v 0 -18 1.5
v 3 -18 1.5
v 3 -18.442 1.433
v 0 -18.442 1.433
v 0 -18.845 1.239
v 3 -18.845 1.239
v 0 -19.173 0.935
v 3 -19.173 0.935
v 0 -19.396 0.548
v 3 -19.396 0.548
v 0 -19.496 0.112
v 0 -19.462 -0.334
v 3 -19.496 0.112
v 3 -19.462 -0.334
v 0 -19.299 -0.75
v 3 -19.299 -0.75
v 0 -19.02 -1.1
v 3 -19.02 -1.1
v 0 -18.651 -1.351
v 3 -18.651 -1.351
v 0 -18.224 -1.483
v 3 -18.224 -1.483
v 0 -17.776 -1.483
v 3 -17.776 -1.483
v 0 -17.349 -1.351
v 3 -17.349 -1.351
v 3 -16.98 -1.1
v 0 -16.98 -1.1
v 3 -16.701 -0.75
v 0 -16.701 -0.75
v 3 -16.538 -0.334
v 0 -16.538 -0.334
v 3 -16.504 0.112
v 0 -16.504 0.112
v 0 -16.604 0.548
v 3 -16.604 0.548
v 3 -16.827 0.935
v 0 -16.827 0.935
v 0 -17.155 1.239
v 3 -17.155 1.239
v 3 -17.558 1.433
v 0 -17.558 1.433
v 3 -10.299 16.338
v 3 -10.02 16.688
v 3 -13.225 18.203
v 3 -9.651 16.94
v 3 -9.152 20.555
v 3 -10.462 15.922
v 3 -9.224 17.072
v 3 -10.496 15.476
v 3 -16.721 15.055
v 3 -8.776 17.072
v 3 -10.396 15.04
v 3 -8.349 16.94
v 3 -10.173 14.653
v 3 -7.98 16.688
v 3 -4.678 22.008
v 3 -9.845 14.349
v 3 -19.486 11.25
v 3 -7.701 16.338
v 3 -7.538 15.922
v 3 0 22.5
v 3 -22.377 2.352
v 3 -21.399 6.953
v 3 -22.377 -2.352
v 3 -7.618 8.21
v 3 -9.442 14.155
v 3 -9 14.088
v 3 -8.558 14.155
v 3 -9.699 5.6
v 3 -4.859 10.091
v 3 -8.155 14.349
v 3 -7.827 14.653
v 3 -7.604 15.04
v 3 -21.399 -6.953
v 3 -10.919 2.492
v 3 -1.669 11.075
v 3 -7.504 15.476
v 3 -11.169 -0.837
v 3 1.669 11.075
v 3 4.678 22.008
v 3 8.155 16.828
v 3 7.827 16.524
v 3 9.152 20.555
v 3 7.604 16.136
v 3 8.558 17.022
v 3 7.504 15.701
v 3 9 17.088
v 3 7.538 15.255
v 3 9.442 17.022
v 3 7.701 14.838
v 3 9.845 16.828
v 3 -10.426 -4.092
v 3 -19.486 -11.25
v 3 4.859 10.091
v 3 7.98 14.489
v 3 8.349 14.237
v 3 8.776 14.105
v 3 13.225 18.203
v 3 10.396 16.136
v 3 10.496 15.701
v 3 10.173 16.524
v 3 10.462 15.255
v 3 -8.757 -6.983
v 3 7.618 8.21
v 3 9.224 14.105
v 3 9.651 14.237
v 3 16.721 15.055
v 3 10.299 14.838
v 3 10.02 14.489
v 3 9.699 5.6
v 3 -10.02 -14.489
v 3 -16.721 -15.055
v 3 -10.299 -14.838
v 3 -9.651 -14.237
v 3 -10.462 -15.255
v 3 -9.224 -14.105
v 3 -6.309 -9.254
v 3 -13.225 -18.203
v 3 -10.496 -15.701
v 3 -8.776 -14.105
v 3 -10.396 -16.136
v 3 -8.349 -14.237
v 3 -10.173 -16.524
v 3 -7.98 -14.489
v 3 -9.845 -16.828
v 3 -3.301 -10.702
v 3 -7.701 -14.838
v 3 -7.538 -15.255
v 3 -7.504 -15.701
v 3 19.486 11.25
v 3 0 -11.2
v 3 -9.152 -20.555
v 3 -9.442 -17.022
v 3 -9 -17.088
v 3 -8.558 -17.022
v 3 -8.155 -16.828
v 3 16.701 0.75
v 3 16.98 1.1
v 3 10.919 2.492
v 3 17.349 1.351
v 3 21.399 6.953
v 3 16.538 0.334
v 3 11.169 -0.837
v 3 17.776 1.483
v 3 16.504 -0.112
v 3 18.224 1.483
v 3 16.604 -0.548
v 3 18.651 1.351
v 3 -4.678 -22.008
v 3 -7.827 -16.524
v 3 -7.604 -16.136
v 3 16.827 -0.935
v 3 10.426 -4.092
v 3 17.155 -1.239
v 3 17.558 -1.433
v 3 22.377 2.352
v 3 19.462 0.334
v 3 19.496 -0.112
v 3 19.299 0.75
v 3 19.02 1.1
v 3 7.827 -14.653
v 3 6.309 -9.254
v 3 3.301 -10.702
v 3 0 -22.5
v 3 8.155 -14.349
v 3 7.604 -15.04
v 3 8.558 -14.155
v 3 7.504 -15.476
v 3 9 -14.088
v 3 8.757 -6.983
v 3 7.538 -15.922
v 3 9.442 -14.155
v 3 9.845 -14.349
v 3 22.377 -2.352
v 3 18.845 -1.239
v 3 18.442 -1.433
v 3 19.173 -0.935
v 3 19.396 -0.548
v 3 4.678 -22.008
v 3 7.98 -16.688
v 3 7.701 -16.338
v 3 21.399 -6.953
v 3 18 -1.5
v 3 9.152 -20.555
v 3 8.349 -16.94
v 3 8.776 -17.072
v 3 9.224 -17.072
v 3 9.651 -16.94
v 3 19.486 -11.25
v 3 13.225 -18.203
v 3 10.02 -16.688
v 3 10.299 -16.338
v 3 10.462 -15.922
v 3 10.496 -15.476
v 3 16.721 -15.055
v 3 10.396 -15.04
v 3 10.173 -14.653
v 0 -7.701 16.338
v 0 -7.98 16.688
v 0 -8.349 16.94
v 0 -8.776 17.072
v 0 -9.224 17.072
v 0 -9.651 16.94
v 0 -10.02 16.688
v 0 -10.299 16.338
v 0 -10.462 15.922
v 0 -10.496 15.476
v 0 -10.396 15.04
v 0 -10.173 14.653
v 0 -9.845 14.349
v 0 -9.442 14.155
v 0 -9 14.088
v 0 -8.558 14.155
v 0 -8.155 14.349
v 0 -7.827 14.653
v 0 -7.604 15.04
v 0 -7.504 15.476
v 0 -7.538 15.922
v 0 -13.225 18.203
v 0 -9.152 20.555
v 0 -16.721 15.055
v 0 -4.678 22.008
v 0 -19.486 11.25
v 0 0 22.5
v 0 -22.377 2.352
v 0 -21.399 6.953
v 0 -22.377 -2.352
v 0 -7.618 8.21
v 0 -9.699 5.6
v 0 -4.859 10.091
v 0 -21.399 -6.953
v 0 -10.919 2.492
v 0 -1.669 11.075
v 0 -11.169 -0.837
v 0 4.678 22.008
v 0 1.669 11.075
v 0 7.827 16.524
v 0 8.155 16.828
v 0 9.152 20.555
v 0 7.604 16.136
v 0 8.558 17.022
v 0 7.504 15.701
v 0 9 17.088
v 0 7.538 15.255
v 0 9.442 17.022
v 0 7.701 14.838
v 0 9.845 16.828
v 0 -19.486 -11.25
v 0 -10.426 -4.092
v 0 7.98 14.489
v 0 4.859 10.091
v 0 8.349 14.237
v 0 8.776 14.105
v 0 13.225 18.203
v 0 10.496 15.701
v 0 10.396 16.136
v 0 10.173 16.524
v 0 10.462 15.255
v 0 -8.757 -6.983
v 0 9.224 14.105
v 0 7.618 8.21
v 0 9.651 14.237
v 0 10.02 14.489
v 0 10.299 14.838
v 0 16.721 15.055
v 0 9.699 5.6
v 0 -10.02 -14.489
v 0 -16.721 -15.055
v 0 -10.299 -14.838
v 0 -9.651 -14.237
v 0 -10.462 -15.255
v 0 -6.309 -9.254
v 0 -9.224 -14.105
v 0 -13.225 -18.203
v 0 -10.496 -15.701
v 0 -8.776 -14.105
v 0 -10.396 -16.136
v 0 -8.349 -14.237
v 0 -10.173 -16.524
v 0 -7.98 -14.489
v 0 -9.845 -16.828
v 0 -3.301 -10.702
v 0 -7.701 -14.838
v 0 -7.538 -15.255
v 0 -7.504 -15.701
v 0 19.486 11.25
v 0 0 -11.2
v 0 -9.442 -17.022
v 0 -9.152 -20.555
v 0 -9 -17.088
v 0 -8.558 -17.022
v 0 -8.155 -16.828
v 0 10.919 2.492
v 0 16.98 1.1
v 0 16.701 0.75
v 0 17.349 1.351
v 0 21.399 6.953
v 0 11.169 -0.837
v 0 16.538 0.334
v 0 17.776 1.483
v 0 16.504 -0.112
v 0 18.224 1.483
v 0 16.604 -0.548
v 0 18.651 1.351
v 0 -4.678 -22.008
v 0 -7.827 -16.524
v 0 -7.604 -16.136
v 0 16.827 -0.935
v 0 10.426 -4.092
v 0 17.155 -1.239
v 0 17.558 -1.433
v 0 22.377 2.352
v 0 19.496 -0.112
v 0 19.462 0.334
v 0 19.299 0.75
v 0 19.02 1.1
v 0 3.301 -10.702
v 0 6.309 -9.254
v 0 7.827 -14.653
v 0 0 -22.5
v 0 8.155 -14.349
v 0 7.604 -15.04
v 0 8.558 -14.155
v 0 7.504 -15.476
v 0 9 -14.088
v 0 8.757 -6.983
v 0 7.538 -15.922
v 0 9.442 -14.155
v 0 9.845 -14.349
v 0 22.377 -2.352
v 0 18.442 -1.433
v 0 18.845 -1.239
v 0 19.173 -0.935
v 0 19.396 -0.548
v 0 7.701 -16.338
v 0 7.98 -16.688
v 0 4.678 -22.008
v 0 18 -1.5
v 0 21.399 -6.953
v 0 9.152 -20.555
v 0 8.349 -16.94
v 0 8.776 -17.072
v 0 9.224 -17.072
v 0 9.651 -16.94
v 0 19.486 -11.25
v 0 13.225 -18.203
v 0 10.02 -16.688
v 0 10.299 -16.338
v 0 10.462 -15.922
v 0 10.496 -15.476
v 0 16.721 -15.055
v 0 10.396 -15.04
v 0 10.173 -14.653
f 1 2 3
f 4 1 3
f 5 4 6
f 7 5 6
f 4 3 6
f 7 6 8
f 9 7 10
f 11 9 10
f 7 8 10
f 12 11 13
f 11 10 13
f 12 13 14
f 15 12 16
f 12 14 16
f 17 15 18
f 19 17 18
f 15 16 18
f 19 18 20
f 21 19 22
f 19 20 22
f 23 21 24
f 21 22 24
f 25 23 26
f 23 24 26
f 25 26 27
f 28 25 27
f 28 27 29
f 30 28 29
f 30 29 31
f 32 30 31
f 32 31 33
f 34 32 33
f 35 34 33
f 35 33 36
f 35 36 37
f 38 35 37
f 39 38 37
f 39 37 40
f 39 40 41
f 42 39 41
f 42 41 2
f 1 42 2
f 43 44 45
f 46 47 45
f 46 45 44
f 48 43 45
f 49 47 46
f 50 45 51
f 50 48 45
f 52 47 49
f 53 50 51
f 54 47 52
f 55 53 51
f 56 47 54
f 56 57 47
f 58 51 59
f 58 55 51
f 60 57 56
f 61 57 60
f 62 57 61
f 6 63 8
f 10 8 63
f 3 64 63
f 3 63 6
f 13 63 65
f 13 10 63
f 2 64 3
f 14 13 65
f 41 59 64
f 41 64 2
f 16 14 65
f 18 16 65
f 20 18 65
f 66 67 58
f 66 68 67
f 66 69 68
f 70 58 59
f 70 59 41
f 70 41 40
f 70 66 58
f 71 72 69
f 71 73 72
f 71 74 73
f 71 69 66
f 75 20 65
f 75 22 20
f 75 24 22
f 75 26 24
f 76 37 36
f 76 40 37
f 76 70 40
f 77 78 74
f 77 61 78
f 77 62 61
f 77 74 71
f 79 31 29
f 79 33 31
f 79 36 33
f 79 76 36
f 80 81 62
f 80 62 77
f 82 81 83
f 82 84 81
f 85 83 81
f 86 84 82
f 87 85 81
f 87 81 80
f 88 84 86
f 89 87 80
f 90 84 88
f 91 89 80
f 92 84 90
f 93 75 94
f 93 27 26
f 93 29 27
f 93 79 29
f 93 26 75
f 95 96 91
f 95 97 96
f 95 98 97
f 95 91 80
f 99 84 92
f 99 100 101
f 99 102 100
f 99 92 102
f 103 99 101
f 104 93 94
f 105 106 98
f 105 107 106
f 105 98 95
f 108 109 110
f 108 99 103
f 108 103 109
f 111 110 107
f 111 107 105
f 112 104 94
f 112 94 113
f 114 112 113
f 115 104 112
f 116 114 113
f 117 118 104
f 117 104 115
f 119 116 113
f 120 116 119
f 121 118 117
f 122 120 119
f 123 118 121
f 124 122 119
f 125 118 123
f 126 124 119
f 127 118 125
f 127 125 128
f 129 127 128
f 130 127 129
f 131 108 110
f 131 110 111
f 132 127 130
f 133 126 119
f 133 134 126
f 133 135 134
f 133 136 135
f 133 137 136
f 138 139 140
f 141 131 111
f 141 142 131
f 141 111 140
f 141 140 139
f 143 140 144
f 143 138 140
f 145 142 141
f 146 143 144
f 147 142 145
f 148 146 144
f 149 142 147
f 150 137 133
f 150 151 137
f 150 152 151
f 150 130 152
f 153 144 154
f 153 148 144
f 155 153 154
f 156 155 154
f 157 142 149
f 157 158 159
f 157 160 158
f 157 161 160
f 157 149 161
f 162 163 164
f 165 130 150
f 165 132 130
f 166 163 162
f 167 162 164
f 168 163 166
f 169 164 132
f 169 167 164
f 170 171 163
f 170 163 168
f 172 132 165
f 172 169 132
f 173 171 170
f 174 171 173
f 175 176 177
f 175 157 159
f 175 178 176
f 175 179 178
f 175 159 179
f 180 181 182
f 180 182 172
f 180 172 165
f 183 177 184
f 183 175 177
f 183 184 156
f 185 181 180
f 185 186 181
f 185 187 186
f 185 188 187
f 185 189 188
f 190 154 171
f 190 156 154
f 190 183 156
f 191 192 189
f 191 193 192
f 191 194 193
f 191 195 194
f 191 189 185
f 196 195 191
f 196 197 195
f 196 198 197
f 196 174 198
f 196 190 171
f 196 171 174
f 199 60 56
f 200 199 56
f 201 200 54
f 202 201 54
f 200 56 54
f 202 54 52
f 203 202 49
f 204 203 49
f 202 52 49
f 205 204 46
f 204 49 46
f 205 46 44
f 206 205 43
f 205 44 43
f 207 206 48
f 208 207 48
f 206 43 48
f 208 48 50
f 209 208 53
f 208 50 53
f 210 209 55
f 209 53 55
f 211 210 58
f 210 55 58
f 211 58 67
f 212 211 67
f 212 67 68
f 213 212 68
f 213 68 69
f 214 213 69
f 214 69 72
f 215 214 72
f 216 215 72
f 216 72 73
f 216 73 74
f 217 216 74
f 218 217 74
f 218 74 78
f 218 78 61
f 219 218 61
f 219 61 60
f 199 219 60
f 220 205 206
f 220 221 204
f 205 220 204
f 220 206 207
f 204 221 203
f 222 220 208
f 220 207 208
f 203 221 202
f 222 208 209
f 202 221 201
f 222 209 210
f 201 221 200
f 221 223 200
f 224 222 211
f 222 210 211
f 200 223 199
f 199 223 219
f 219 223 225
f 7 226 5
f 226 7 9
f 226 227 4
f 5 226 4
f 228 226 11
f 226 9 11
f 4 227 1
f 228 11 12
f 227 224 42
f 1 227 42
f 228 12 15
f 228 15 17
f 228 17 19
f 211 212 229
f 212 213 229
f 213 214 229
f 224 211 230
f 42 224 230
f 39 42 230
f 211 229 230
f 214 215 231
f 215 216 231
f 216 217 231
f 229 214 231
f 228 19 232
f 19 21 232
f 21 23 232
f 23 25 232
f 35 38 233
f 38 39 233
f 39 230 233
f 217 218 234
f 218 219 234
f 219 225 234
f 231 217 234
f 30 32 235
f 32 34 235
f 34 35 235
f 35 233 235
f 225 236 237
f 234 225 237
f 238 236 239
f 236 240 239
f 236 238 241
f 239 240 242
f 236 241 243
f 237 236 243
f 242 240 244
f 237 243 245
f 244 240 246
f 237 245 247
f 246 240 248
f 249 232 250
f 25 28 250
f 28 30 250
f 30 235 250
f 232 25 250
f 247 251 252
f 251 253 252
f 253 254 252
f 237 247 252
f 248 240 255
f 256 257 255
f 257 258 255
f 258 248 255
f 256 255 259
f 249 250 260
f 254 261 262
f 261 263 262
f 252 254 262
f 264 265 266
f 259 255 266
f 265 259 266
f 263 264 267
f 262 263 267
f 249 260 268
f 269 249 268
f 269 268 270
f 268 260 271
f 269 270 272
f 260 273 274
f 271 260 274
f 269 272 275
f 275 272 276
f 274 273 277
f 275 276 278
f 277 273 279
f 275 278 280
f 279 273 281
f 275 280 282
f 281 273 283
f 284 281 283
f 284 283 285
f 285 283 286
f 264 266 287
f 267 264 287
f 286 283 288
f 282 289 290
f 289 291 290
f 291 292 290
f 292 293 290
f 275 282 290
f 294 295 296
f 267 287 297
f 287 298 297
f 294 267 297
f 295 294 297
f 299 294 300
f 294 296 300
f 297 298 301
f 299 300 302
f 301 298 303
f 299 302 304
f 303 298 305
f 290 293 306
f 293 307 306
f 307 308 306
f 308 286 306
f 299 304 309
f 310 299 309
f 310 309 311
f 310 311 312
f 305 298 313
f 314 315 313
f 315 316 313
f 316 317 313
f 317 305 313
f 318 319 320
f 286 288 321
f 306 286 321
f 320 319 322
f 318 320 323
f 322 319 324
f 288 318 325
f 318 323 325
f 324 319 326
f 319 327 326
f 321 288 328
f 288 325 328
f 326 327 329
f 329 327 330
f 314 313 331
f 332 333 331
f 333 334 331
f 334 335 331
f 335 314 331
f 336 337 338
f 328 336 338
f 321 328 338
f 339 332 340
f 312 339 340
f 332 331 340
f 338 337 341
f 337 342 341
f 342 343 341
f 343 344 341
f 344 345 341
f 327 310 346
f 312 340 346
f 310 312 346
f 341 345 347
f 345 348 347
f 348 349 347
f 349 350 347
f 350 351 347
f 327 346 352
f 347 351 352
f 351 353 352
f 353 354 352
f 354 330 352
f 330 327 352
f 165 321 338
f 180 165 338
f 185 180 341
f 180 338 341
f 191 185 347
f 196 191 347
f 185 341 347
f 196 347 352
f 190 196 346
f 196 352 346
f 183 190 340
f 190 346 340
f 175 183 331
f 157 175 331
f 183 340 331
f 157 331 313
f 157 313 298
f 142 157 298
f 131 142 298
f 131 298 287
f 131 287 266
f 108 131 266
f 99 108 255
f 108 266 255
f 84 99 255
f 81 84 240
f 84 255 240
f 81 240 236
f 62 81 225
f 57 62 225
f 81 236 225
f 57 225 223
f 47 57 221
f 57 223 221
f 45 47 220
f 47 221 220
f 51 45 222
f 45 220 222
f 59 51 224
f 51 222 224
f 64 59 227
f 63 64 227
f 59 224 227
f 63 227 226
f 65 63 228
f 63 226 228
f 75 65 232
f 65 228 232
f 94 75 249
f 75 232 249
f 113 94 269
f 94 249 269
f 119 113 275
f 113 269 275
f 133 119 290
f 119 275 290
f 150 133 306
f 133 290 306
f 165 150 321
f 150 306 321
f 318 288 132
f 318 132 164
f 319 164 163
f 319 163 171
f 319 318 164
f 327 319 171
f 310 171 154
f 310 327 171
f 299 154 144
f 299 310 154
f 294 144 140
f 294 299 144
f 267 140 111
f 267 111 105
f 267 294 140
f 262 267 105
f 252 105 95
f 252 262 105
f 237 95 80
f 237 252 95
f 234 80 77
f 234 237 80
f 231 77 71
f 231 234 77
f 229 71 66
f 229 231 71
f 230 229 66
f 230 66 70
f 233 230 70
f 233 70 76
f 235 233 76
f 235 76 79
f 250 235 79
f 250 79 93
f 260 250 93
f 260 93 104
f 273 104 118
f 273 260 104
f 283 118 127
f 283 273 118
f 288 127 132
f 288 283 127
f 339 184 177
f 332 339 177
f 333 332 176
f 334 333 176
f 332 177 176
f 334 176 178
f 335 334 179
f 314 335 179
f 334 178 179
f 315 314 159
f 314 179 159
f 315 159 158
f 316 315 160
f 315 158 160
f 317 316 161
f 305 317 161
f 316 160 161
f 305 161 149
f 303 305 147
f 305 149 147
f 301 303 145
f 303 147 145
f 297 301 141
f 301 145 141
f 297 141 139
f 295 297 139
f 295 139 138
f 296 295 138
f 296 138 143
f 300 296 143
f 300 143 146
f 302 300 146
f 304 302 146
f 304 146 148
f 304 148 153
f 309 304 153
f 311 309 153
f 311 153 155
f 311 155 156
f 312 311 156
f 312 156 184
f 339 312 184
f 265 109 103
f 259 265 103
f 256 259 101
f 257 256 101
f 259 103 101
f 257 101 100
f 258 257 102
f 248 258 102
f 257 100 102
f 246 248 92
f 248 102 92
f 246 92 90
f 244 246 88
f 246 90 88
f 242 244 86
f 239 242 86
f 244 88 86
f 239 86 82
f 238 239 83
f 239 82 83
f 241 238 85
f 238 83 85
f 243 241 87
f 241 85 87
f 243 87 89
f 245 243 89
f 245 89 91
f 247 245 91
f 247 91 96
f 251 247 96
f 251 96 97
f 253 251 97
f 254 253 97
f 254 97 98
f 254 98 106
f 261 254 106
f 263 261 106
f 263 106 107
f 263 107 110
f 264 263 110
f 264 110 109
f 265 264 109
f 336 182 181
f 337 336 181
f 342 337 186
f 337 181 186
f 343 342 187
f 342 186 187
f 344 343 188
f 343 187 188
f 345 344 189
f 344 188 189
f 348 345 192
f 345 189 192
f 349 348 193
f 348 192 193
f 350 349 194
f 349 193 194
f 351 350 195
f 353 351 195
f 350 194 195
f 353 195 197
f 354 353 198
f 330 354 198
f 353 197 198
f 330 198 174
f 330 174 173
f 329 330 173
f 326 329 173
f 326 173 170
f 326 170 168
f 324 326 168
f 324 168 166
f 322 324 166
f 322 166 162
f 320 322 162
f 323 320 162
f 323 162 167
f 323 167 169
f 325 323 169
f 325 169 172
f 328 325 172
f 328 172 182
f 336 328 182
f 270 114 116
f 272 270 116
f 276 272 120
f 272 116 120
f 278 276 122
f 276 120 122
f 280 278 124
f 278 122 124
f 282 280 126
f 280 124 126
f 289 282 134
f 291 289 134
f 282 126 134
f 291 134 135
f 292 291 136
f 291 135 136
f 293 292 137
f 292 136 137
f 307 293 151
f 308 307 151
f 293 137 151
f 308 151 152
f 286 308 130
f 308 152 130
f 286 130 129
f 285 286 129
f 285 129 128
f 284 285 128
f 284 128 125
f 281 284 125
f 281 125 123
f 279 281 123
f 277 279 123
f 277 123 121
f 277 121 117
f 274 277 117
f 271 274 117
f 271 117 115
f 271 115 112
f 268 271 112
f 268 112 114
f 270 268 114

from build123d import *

# Parameters (mm, degrees)
SKETCH1_R          = 22.5
SKETCH1_R_2        = 11.2
EXTRUDE1_DEPTH     = 3
SKETCH2_R          = 1.5
CUT_EXTRUDE1_DEPTH = 4
CIRPATTERN1_COUNT  = 6


with BuildPart() as part:
    # Sketch1 → Extrude1 (new body)
    with BuildSketch(Plane(origin=(0, 0, 0), x_dir=(0, 0, -1), z_dir=(1, 0, 0))):
        Circle(SKETCH1_R)
        Circle(SKETCH1_R_2, mode=Mode.SUBTRACT)
    extrude(amount=EXTRUDE1_DEPTH)

    # Sketch2 → Cut-Extrude1 (cut, through all)
    with BuildSketch(Plane(origin=(3, 0, 0), x_dir=(0, 0, -1), z_dir=(1, 0, 0))):
        with Locations((0, 18)):
            Circle(SKETCH2_R)
    cut_extrude1 = extrude(amount=-CUT_EXTRUDE1_DEPTH, mode=Mode.SUBTRACT)

    # CirPattern1: Cut-Extrude1 ×6 about axis
    cirpattern1_axis = Axis((0, 0, 0), (1, 0, 0))
    for i in range(1, CIRPATTERN1_COUNT):
        add(cut_extrude1.rotate(cirpattern1_axis, i * 360 / CIRPATTERN1_COUNT), mode=Mode.SUBTRACT)


solid = part.part
